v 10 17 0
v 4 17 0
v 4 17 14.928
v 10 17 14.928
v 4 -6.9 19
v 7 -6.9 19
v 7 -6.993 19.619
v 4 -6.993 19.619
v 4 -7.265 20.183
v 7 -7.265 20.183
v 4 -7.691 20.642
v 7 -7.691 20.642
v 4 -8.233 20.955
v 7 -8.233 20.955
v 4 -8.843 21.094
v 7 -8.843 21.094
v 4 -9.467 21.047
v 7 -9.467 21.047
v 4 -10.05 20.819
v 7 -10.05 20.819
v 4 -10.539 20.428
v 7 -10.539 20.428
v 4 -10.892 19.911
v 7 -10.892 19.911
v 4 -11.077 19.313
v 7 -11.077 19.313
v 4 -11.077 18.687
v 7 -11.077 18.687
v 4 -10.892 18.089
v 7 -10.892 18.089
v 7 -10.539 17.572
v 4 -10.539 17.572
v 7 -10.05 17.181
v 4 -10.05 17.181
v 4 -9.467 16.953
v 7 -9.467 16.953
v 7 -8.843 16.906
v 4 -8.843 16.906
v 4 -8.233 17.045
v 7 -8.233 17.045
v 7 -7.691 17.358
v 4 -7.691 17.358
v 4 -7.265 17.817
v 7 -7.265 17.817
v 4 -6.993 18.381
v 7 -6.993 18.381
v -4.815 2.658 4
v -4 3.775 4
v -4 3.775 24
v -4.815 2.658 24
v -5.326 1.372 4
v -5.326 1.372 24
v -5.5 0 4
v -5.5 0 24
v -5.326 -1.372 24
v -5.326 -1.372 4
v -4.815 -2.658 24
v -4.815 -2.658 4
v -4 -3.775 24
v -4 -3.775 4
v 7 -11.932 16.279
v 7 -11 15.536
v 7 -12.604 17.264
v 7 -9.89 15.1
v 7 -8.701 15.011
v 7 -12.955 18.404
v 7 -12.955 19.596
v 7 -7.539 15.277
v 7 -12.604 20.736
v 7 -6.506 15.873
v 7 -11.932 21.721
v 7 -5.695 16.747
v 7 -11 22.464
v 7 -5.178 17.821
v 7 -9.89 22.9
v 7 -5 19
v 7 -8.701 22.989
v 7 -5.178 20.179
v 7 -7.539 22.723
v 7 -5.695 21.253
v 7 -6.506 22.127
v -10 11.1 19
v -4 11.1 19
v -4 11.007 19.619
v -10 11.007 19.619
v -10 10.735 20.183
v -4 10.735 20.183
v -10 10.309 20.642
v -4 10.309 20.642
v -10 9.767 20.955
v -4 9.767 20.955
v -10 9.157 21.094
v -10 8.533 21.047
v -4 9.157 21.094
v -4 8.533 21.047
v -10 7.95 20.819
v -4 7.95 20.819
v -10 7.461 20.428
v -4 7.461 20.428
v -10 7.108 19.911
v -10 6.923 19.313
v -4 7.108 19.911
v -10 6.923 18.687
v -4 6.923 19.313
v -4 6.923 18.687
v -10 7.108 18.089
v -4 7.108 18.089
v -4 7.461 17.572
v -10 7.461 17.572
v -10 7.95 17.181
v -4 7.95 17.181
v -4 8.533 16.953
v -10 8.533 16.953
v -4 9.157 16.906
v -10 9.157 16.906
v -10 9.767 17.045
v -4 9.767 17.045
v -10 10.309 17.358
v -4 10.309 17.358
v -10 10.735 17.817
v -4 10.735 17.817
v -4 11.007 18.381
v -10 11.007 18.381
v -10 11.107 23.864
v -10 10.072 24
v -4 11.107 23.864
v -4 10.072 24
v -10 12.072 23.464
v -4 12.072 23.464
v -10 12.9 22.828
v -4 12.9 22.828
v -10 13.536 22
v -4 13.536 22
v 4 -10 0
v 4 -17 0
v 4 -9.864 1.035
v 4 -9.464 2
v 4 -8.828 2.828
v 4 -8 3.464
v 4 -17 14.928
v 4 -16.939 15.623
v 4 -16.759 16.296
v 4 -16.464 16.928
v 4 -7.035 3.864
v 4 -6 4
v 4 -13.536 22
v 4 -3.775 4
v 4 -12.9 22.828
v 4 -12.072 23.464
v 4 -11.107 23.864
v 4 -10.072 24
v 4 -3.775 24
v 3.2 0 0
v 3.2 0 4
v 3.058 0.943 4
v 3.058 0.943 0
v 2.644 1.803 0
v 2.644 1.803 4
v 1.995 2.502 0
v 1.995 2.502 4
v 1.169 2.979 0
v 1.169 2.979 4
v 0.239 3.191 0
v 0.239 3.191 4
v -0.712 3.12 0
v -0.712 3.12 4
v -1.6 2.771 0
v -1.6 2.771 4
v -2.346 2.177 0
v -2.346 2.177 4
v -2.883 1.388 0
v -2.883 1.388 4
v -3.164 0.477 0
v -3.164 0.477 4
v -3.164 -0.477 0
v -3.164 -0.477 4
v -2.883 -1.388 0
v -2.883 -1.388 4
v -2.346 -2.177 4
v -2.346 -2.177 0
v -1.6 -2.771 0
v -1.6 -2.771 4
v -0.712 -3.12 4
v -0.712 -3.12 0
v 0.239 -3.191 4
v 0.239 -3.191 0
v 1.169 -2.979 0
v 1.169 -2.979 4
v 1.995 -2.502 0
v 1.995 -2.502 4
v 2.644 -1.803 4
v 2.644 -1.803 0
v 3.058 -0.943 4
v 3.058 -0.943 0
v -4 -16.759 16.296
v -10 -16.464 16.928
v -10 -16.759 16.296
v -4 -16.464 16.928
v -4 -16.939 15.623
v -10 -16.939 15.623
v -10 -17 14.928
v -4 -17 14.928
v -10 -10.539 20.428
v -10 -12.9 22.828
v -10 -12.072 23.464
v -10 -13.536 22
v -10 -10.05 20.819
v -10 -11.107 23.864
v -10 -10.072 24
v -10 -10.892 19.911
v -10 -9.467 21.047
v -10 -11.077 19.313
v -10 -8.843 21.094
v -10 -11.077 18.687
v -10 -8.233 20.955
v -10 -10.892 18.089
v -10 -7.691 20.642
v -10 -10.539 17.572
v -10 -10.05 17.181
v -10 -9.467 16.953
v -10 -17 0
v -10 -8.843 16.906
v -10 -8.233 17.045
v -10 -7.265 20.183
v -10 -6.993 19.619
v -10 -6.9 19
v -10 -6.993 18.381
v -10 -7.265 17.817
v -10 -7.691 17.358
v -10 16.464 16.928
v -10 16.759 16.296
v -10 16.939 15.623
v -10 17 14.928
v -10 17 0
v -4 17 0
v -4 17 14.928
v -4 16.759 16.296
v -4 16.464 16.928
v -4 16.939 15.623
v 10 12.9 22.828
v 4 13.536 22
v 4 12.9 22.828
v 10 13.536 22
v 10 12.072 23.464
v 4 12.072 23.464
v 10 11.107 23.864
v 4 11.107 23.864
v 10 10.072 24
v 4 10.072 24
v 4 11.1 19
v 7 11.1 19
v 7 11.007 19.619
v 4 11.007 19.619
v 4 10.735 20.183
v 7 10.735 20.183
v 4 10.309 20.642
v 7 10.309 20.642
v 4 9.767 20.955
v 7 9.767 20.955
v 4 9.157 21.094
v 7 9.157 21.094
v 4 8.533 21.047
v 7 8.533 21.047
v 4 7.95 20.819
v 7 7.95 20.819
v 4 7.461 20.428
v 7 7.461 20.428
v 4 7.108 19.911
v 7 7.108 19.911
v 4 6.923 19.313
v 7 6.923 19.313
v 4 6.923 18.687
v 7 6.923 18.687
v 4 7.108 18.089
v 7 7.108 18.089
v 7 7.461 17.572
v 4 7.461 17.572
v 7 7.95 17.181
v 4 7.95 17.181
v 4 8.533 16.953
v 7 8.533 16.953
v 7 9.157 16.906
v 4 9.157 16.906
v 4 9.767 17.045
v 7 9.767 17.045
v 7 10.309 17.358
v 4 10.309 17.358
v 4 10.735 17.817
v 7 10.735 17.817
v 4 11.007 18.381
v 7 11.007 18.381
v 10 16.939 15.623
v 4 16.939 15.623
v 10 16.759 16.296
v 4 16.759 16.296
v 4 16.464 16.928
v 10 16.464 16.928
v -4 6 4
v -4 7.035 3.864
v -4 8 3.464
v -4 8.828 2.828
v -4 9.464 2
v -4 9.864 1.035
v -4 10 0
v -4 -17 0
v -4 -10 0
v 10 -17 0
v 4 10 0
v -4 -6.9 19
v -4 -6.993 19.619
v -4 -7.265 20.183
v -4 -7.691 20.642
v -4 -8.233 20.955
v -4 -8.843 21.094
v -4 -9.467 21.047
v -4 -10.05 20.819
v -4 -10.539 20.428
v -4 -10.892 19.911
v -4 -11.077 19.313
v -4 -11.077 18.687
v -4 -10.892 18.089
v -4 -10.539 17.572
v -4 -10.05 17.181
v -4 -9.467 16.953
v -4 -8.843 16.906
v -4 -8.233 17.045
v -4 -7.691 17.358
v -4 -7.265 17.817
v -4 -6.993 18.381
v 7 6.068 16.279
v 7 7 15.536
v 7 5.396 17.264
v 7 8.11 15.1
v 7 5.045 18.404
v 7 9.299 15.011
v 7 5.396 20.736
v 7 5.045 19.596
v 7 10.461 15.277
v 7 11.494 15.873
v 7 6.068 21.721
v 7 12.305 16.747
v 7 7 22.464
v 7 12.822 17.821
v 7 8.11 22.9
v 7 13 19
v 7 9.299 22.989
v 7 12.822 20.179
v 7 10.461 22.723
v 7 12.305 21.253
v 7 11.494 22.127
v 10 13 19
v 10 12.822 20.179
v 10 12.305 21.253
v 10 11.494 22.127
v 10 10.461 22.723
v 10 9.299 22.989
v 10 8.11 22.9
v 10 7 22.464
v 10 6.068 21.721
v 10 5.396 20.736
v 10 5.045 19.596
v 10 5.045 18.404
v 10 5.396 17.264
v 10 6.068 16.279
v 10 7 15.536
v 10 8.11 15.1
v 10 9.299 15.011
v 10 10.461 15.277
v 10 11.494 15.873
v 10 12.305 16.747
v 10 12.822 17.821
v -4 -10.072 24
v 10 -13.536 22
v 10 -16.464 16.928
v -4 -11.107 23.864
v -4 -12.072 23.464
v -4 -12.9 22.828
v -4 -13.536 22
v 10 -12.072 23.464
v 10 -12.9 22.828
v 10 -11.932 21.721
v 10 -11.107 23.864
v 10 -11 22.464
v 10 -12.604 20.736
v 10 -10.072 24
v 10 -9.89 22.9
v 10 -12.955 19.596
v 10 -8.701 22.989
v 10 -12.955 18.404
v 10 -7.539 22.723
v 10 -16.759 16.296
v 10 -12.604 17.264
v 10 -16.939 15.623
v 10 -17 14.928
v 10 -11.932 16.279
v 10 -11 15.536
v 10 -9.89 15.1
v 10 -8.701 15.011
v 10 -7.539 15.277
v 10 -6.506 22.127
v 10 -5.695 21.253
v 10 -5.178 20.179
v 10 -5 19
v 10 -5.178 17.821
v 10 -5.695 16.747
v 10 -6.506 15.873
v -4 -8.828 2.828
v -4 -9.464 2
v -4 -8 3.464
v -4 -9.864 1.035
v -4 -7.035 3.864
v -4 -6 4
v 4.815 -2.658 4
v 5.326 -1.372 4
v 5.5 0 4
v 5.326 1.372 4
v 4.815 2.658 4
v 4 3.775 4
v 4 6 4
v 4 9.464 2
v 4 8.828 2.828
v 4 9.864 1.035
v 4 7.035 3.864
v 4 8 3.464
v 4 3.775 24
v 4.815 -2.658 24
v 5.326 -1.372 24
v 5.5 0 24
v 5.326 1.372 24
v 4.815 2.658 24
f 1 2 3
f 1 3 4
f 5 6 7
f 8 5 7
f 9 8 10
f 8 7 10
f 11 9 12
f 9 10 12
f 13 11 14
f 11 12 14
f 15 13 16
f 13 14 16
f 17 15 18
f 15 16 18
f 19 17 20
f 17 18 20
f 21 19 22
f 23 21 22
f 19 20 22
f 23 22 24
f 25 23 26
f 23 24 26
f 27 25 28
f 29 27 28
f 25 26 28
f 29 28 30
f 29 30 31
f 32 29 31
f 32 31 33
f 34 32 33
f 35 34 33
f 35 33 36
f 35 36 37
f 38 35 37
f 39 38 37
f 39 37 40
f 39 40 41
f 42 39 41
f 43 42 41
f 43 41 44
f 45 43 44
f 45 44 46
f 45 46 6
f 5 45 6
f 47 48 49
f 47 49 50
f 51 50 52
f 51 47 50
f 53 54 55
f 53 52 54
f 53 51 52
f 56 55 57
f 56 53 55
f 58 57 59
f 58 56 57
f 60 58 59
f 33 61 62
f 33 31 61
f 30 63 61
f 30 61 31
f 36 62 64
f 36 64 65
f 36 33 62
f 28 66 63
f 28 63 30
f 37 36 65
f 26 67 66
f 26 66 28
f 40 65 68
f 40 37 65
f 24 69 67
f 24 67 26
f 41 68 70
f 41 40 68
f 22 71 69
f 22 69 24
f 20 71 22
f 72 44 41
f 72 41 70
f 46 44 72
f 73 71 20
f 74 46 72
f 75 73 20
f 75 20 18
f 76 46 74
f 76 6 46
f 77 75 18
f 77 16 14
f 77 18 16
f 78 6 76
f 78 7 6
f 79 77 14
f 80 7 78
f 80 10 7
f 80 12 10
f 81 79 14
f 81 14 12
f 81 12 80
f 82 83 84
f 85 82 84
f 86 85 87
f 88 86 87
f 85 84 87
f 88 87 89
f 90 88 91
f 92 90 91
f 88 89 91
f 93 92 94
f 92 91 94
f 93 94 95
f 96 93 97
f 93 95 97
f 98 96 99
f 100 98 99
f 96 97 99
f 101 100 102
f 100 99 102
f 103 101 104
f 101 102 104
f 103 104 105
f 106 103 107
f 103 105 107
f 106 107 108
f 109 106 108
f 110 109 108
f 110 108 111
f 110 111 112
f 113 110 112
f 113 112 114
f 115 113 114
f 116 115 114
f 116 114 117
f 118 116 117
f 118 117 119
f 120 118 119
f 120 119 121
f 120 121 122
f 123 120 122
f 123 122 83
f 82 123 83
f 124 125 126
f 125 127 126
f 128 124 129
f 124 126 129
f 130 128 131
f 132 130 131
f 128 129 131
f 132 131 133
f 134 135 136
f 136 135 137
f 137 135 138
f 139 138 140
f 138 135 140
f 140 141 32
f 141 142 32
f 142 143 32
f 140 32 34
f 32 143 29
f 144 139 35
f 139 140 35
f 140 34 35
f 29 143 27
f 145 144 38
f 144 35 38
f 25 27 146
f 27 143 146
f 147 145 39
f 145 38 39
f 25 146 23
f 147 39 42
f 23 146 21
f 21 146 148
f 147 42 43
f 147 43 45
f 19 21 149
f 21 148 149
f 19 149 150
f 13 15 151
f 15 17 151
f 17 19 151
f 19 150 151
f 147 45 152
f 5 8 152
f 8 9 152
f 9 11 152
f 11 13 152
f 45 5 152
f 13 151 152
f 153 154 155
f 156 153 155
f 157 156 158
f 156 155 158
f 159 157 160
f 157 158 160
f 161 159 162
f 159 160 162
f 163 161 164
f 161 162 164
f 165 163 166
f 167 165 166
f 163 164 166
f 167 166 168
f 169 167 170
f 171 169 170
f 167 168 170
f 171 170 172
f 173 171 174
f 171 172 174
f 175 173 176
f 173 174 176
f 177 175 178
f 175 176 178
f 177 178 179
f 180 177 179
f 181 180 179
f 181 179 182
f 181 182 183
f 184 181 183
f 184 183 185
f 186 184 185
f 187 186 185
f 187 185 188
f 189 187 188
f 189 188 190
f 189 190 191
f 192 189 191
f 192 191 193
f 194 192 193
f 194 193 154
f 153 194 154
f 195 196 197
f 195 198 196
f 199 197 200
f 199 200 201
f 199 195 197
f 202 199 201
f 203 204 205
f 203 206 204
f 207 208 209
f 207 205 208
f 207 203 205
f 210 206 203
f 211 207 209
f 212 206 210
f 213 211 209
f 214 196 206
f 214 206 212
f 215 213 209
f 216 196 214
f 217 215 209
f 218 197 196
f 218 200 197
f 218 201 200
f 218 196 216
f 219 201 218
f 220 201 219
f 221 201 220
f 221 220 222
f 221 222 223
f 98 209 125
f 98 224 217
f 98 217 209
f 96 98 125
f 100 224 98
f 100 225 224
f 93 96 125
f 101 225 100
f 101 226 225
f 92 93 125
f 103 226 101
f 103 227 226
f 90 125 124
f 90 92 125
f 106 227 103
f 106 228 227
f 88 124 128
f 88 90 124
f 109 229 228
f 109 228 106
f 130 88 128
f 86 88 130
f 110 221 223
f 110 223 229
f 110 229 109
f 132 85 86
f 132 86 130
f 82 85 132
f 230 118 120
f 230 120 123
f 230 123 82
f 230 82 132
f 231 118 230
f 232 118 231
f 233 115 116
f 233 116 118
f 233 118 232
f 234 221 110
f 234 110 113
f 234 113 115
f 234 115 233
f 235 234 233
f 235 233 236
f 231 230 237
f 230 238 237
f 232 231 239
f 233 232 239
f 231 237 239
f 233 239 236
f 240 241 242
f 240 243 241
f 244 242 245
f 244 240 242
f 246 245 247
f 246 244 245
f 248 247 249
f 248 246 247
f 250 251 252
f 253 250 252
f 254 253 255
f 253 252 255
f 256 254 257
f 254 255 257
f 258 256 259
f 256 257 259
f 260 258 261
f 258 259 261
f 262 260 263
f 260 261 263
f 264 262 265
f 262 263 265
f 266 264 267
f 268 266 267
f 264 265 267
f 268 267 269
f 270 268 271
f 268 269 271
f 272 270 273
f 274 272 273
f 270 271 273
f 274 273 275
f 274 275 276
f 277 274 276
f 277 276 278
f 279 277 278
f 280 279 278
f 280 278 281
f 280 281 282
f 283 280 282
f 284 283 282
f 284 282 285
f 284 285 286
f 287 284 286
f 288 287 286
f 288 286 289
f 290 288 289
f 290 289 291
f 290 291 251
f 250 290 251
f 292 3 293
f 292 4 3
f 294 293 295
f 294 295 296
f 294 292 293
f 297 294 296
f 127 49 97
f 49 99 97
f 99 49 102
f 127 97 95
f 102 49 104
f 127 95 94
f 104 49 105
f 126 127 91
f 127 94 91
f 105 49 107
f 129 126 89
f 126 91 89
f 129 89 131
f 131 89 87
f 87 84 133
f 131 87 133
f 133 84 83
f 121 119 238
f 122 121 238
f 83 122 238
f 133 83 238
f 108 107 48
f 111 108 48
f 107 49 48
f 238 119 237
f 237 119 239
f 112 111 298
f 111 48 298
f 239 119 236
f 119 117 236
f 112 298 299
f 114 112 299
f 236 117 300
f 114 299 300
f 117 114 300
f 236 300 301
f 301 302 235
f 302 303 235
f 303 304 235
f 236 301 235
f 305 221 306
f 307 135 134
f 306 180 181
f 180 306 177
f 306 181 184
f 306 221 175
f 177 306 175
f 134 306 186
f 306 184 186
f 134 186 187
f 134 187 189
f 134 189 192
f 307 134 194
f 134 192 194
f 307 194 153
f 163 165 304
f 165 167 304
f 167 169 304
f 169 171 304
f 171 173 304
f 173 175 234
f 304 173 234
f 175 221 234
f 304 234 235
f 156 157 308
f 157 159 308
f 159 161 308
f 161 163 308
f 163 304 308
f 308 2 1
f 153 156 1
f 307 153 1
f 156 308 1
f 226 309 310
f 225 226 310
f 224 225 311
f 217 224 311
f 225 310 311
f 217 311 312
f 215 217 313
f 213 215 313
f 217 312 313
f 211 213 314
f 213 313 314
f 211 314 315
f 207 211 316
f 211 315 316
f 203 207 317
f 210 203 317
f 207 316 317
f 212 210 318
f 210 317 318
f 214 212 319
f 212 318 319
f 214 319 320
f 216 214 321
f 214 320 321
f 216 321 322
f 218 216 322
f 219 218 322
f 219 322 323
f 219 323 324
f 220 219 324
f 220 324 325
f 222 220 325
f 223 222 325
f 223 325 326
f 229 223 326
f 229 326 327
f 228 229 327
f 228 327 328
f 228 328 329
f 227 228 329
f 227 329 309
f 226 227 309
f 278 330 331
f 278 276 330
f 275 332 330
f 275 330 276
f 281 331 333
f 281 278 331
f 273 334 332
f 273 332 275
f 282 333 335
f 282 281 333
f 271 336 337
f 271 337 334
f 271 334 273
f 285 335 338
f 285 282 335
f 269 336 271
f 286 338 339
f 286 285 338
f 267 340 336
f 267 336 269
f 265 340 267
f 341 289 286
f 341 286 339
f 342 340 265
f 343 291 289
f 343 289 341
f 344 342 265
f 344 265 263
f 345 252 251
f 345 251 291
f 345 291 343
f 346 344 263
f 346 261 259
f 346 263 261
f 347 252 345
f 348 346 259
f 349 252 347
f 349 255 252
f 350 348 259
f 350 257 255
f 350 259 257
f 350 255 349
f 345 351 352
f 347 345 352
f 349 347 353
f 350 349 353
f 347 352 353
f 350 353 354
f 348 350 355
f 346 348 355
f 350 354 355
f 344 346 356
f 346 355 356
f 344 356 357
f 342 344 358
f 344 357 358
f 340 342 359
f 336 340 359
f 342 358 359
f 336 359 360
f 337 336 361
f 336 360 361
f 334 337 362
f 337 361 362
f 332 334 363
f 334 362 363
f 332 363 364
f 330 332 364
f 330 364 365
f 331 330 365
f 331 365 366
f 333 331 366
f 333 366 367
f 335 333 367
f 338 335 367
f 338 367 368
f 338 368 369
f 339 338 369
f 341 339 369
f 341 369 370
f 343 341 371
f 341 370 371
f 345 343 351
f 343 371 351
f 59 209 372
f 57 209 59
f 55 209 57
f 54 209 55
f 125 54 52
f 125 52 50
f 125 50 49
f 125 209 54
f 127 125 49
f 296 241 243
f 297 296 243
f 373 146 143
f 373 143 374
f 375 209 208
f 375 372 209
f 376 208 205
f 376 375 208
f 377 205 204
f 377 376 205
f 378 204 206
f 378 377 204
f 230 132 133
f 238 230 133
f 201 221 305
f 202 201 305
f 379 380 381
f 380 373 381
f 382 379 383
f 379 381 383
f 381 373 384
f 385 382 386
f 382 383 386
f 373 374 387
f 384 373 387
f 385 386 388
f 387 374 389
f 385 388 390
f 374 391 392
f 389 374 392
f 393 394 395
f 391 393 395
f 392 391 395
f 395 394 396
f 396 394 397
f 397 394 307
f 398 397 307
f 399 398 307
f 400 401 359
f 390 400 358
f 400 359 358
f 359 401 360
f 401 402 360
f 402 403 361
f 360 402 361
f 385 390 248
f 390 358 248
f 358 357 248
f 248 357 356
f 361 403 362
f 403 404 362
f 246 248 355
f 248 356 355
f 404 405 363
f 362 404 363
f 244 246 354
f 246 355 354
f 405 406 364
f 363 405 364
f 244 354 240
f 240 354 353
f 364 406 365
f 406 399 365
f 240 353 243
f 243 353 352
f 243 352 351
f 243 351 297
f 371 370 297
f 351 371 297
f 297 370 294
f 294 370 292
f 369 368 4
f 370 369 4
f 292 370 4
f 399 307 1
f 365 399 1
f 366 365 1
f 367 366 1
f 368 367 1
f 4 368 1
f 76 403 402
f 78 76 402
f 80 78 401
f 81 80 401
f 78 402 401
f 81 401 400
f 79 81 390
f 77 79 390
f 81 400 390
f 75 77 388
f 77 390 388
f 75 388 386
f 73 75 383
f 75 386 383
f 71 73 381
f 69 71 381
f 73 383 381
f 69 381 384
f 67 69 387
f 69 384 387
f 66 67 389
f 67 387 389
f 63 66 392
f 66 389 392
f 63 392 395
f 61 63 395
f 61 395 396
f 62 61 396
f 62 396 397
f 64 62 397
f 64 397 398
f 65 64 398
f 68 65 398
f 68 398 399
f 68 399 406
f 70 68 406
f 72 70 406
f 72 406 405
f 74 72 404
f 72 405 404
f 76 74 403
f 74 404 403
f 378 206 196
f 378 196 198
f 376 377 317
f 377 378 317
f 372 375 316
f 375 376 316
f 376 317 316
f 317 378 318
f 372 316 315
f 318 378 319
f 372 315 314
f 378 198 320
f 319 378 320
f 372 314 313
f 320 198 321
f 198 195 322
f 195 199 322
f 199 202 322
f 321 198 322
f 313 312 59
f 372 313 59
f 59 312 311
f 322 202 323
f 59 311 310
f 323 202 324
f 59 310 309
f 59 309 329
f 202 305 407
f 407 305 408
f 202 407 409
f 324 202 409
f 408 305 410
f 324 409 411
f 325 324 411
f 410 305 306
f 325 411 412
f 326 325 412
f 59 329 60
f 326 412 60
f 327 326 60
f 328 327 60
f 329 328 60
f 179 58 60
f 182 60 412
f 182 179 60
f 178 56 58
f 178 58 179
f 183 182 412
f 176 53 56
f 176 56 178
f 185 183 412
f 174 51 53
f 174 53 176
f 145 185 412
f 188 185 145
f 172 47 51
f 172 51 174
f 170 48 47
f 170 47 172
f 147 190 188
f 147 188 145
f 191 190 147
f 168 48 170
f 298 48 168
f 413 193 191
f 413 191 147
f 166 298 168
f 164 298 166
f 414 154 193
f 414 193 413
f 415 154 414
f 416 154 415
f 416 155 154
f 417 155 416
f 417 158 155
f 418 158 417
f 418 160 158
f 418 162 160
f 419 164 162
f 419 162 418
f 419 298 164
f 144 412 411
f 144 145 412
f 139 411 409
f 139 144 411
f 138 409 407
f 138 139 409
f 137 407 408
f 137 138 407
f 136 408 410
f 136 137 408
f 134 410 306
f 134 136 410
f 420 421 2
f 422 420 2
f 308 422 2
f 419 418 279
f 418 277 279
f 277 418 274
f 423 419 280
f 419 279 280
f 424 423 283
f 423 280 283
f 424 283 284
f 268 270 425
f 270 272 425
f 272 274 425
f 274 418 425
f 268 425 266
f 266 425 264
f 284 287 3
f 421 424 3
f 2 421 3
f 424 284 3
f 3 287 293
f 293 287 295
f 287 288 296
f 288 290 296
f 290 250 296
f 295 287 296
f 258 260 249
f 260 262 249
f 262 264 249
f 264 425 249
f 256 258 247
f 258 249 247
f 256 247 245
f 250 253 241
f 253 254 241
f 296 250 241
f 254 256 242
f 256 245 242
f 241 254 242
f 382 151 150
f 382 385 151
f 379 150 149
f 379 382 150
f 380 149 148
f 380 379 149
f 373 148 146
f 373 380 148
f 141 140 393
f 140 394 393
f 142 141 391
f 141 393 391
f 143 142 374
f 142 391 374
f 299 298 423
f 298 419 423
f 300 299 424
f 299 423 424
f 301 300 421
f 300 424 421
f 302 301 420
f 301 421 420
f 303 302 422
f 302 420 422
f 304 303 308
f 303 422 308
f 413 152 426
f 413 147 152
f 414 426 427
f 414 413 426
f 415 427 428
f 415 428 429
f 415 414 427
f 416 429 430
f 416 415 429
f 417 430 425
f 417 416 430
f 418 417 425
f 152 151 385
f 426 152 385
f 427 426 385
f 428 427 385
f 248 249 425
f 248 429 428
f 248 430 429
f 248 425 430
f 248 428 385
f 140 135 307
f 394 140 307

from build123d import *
from OCP.BRepFilletAPI import BRepFilletAPI_MakeChamfer

# Parameters (mm, degrees)
ESQUISSE1_W             = 20
ESQUISSE1_H             = 34
BOSS_EXTRU_1_DEPTH      = 4
ESQUISSE2_W             = 8
ESQUISSE2_H             = 7
ENL_V_MAT_EXTRU_1_DEPTH = 21.124611797
CONG_1_R                = 4
ESQUISSE3_W             = 6
ESQUISSE3_H             = 34
BOSS_EXTRU_2_DEPTH      = 20
ESQUISSE4_R             = 2.1
ENL_V_MAT_EXTRU_2_DEPTH = 36.566838488
CHANFREIN1_SIZE         = 8
CHANFREIN1_SIZE2        = 4.618802154
CONG_2_R                = 4
ESQUISSE5_R             = 3.2
ENL_V_MAT_EXTRU_3_DEPTH = 29.08914381
ESQUISSE6_R             = 5.5
ENL_V_MAT_EXTRU_4_DEPTH = 29.08914381
ESQUISSE7_R             = 4
ENL_V_MAT_EXTRU_5_DEPTH = 3


with BuildPart() as part:
    # Esquisse1 → Boss.-Extru.1 (new body)
    with BuildSketch(Plane.XY):
        Rectangle(ESQUISSE1_W, ESQUISSE1_H)
    extrude(amount=BOSS_EXTRU_1_DEPTH)

    # Esquisse2 → Enlèv. mat.-Extru.1 (cut, through all)
    with BuildSketch(Plane.XY.offset(4)):
        with Locations((0, 13.5)):
            Rectangle(ESQUISSE2_W, ESQUISSE2_H)
        with Locations((0, -13.5)):
            Rectangle(ESQUISSE2_W, ESQUISSE2_H)
    extrude(amount=-ENL_V_MAT_EXTRU_1_DEPTH, mode=Mode.SUBTRACT)

    # Congé1
    cong_1_edges = [part.edges().sort_by_distance(p)[0] for p in [
        (0, -10, 4),
        (0, 10, 4),
    ]]
    fillet(cong_1_edges, radius=CONG_1_R - 0.0001)  # a hair under: the kernel refuses the full size

    # Esquisse3 → Boss.-Extru.2 (add)
    with BuildSketch(Plane.XY.offset(4)):
        with Locations((-7, 0)):
            Rectangle(ESQUISSE3_W, ESQUISSE3_H)
        with Locations((7, 0)):
            Rectangle(ESQUISSE3_W, ESQUISSE3_H)
    extrude(amount=BOSS_EXTRU_2_DEPTH)

    # Esquisse4 → Enlèv. mat.-Extru.2 (cut, through all)
    with BuildSketch(Plane(origin=(10, 0, 0), x_dir=(0, 0, -1), z_dir=(1, 0, 0))):
        with Locations(Location((-19, 9, 0), (0, 0, 90))):
            Circle(ESQUISSE4_R)
        with Locations(Location((-19, -9, 0), (0, 0, 90))):
            Circle(ESQUISSE4_R)
    extrude(amount=-ENL_V_MAT_EXTRU_2_DEPTH, mode=Mode.SUBTRACT)

    # Chanfrein1: one chamfer whose edges measure the first distance from different faces: ONE call of the kernel's chamfer builder (chamfer() names one face for all edges)
    chanfrein1_edges_1 = [part.edges().sort_by_distance(p)[0] for p in [
        (-7, -17, 24),
    ]]
    chanfrein1_side_1 = [part.faces().sort_by_distance(p)[0] for p in [
        (-7, -17, 12),
    ]]
    chanfrein1_edges_2 = [part.edges().sort_by_distance(p)[0] for p in [
        (-7, 17, 24),
    ]]
    chanfrein1_side_2 = [part.faces().sort_by_distance(p)[0] for p in [
        (-7, 17, 12),
    ]]
    chanfrein1_edges_3 = [part.edges().sort_by_distance(p)[0] for p in [
        (7, -17, 24),
    ]]
    chanfrein1_side_3 = [part.faces().sort_by_distance(p)[0] for p in [
        (7, -17, 12),
    ]]
    chanfrein1_edges_4 = [part.edges().sort_by_distance(p)[0] for p in [
        (7, 17, 24),
    ]]
    chanfrein1_side_4 = [part.faces().sort_by_distance(p)[0] for p in [
        (7, 17, 12),
    ]]
    chanfrein1 = BRepFilletAPI_MakeChamfer(part.part.solid().wrapped)
    for e in chanfrein1_edges_1:
        chanfrein1.Add(CHANFREIN1_SIZE, CHANFREIN1_SIZE2, e.wrapped, chanfrein1_side_1[0].wrapped)  # the first distance lies on this face
    for e in chanfrein1_edges_2:
        chanfrein1.Add(CHANFREIN1_SIZE, CHANFREIN1_SIZE2, e.wrapped, chanfrein1_side_2[0].wrapped)  # the first distance lies on this face
    for e in chanfrein1_edges_3:
        chanfrein1.Add(CHANFREIN1_SIZE, CHANFREIN1_SIZE2, e.wrapped, chanfrein1_side_3[0].wrapped)  # the first distance lies on this face
    for e in chanfrein1_edges_4:
        chanfrein1.Add(CHANFREIN1_SIZE, CHANFREIN1_SIZE2, e.wrapped, chanfrein1_side_4[0].wrapped)  # the first distance lies on this face
    add(Compound.cast(chanfrein1.Shape()), mode=Mode.REPLACE)

    # Congé2
    cong_2_edges = [part.edges().sort_by_distance(p)[0] for p in [
        (-7, 12.381197846, 24),
        (-7, -12.381197846, 24),
        (-7, -17, 16),
        (7, 12.381197846, 24),
        (7, -12.381197846, 24),
        (7, -17, 16),
        (-7, 17, 16),
        (7, 17, 16),
    ]]
    fillet(cong_2_edges, radius=CONG_2_R)

    # Esquisse5 → Enlèv. mat.-Extru.3 (cut, through all)
    with BuildSketch(Plane.XY.offset(4)):
        Circle(ESQUISSE5_R)
    extrude(amount=-ENL_V_MAT_EXTRU_3_DEPTH, mode=Mode.SUBTRACT)

    # Esquisse6 → Enlèv. mat.-Extru.4 (cut, through all)
    with BuildSketch(Plane.XY.offset(4)):
        Circle(ESQUISSE6_R)
    extrude(amount=ENL_V_MAT_EXTRU_4_DEPTH, mode=Mode.SUBTRACT)

    # Esquisse7 → Enlèv. mat.-Extru.5 (cut)
    with BuildSketch(Plane(origin=(10, 0, 0), x_dir=(0, 0, -1), z_dir=(1, 0, 0))):
        with Locations(Location((-19, 9, 0), (0, 0, 90))):
            Circle(ESQUISSE7_R)
        with Locations(Location((-19, -9, 0), (0, 0, 90))):
            Circle(ESQUISSE7_R)
    extrude(amount=-ENL_V_MAT_EXTRU_5_DEPTH, mode=Mode.SUBTRACT)


solid = part.part
